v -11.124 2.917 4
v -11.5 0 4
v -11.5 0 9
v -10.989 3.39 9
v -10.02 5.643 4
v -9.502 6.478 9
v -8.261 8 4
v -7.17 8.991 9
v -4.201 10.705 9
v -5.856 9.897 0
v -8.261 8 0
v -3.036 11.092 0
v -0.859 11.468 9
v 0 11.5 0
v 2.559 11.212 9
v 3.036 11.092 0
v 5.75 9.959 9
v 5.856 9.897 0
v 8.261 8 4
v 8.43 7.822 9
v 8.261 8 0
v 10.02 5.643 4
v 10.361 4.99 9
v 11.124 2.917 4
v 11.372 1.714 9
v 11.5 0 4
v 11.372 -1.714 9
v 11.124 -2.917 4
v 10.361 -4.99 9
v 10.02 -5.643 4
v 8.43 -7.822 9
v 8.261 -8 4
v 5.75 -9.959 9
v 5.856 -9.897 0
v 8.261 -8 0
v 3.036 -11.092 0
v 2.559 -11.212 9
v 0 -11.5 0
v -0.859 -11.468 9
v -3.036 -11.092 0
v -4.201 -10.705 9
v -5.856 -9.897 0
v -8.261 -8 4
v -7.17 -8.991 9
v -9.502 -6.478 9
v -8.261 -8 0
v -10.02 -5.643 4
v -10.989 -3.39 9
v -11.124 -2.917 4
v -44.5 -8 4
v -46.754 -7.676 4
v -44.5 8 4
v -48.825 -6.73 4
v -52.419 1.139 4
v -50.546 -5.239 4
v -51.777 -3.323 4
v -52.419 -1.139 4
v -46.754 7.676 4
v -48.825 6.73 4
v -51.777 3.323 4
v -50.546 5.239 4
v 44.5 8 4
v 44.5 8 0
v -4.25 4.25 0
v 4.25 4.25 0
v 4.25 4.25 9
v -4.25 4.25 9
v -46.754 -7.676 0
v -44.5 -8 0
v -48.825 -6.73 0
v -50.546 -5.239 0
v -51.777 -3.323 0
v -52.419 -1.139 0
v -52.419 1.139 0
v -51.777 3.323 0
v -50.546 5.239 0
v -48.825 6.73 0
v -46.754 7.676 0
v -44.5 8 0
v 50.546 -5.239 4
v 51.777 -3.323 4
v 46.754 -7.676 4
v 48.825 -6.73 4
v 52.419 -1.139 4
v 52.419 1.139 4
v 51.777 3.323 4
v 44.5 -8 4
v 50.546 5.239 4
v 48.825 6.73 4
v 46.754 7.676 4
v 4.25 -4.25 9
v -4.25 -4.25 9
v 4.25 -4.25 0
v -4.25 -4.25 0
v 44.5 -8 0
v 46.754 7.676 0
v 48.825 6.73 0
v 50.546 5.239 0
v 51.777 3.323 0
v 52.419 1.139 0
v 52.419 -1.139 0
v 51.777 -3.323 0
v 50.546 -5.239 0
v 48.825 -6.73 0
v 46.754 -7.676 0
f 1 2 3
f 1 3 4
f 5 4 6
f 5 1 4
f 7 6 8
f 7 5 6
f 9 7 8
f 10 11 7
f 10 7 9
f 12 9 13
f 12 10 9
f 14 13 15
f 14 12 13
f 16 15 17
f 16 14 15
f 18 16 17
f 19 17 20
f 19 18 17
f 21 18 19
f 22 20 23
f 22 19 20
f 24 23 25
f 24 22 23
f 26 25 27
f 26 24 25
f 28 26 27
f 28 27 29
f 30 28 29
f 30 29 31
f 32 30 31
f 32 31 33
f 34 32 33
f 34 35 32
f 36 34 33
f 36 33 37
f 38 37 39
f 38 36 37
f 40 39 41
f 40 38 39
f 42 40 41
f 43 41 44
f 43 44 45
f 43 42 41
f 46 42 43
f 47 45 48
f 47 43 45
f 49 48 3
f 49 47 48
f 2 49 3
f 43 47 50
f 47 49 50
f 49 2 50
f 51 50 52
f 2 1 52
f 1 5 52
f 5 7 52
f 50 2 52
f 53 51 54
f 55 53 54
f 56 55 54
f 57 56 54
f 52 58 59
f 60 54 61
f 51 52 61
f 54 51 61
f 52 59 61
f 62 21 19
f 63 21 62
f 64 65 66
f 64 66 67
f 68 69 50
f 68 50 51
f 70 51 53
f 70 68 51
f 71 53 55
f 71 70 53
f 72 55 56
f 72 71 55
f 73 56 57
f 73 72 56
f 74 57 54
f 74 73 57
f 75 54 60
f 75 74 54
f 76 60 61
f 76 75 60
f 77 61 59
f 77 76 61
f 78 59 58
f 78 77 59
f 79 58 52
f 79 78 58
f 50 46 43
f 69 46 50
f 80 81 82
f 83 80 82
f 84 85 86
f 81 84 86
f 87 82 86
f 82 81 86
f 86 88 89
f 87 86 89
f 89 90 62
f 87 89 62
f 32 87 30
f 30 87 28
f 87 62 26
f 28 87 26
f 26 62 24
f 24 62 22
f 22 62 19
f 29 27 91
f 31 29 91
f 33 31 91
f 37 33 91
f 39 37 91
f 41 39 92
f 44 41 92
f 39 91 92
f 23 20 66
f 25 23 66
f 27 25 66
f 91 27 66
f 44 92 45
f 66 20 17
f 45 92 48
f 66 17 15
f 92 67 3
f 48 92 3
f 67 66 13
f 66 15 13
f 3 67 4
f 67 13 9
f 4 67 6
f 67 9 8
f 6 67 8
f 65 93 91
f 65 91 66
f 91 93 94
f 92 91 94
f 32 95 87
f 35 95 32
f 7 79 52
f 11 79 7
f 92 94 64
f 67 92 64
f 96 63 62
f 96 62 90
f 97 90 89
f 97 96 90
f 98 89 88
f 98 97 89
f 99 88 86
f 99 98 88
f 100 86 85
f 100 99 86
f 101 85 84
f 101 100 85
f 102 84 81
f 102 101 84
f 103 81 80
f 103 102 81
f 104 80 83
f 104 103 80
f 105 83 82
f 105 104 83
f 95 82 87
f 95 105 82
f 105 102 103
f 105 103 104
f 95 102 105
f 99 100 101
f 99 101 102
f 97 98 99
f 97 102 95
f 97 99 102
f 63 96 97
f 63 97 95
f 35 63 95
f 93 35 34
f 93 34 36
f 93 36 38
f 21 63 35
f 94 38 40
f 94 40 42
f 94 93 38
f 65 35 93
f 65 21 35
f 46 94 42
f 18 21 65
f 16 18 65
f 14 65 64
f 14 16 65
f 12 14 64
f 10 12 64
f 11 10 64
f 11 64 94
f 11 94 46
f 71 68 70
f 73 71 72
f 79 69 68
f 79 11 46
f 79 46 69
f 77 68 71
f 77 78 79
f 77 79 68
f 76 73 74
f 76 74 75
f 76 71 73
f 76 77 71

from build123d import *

# Parameters (mm, degrees)
EXTRUDE_1_DEPTH     = 4
SKETCH_2_R          = 11.5
EXTRUDE_2_DEPTH     = 9
SKETCH_3_W          = 8.5
SKETCH_3_H          = 8.5
CUT_EXTRUDE_1_DEPTH = 10


with BuildPart() as part:
    # Эскиз1 → Бобышка-Вытянуть1 (new body)
    with BuildSketch(Plane.XY):
        with BuildLine():
            Line((-44.5, 8), (44.5, 8))
            ThreePointArc((44.5, 8), (52.5, 0), (44.5, -8))
            Line((44.5, -8), (-44.5, -8))
            ThreePointArc((-44.5, -8), (-52.5, 0), (-44.5, 8))
        make_face()
    extrude(amount=EXTRUDE_1_DEPTH)

    # Эскиз2 → Бобышка-Вытянуть2 (add)
    with BuildSketch(Plane(origin=(0, 0, 0), x_dir=(-1, 0, 0), z_dir=(0, 0, -1))):
        Circle(SKETCH_2_R)
    extrude(amount=-EXTRUDE_2_DEPTH)

    # Эскиз3 → Вырез-Вытянуть1 (cut, through all)
    with BuildSketch(Plane(origin=(0, 0, 0), x_dir=(-1, 0, 0), z_dir=(0, 0, -1))):
        Rectangle(SKETCH_3_W, SKETCH_3_H)
    extrude(amount=-CUT_EXTRUDE_1_DEPTH, mode=Mode.SUBTRACT)


solid = part.part
